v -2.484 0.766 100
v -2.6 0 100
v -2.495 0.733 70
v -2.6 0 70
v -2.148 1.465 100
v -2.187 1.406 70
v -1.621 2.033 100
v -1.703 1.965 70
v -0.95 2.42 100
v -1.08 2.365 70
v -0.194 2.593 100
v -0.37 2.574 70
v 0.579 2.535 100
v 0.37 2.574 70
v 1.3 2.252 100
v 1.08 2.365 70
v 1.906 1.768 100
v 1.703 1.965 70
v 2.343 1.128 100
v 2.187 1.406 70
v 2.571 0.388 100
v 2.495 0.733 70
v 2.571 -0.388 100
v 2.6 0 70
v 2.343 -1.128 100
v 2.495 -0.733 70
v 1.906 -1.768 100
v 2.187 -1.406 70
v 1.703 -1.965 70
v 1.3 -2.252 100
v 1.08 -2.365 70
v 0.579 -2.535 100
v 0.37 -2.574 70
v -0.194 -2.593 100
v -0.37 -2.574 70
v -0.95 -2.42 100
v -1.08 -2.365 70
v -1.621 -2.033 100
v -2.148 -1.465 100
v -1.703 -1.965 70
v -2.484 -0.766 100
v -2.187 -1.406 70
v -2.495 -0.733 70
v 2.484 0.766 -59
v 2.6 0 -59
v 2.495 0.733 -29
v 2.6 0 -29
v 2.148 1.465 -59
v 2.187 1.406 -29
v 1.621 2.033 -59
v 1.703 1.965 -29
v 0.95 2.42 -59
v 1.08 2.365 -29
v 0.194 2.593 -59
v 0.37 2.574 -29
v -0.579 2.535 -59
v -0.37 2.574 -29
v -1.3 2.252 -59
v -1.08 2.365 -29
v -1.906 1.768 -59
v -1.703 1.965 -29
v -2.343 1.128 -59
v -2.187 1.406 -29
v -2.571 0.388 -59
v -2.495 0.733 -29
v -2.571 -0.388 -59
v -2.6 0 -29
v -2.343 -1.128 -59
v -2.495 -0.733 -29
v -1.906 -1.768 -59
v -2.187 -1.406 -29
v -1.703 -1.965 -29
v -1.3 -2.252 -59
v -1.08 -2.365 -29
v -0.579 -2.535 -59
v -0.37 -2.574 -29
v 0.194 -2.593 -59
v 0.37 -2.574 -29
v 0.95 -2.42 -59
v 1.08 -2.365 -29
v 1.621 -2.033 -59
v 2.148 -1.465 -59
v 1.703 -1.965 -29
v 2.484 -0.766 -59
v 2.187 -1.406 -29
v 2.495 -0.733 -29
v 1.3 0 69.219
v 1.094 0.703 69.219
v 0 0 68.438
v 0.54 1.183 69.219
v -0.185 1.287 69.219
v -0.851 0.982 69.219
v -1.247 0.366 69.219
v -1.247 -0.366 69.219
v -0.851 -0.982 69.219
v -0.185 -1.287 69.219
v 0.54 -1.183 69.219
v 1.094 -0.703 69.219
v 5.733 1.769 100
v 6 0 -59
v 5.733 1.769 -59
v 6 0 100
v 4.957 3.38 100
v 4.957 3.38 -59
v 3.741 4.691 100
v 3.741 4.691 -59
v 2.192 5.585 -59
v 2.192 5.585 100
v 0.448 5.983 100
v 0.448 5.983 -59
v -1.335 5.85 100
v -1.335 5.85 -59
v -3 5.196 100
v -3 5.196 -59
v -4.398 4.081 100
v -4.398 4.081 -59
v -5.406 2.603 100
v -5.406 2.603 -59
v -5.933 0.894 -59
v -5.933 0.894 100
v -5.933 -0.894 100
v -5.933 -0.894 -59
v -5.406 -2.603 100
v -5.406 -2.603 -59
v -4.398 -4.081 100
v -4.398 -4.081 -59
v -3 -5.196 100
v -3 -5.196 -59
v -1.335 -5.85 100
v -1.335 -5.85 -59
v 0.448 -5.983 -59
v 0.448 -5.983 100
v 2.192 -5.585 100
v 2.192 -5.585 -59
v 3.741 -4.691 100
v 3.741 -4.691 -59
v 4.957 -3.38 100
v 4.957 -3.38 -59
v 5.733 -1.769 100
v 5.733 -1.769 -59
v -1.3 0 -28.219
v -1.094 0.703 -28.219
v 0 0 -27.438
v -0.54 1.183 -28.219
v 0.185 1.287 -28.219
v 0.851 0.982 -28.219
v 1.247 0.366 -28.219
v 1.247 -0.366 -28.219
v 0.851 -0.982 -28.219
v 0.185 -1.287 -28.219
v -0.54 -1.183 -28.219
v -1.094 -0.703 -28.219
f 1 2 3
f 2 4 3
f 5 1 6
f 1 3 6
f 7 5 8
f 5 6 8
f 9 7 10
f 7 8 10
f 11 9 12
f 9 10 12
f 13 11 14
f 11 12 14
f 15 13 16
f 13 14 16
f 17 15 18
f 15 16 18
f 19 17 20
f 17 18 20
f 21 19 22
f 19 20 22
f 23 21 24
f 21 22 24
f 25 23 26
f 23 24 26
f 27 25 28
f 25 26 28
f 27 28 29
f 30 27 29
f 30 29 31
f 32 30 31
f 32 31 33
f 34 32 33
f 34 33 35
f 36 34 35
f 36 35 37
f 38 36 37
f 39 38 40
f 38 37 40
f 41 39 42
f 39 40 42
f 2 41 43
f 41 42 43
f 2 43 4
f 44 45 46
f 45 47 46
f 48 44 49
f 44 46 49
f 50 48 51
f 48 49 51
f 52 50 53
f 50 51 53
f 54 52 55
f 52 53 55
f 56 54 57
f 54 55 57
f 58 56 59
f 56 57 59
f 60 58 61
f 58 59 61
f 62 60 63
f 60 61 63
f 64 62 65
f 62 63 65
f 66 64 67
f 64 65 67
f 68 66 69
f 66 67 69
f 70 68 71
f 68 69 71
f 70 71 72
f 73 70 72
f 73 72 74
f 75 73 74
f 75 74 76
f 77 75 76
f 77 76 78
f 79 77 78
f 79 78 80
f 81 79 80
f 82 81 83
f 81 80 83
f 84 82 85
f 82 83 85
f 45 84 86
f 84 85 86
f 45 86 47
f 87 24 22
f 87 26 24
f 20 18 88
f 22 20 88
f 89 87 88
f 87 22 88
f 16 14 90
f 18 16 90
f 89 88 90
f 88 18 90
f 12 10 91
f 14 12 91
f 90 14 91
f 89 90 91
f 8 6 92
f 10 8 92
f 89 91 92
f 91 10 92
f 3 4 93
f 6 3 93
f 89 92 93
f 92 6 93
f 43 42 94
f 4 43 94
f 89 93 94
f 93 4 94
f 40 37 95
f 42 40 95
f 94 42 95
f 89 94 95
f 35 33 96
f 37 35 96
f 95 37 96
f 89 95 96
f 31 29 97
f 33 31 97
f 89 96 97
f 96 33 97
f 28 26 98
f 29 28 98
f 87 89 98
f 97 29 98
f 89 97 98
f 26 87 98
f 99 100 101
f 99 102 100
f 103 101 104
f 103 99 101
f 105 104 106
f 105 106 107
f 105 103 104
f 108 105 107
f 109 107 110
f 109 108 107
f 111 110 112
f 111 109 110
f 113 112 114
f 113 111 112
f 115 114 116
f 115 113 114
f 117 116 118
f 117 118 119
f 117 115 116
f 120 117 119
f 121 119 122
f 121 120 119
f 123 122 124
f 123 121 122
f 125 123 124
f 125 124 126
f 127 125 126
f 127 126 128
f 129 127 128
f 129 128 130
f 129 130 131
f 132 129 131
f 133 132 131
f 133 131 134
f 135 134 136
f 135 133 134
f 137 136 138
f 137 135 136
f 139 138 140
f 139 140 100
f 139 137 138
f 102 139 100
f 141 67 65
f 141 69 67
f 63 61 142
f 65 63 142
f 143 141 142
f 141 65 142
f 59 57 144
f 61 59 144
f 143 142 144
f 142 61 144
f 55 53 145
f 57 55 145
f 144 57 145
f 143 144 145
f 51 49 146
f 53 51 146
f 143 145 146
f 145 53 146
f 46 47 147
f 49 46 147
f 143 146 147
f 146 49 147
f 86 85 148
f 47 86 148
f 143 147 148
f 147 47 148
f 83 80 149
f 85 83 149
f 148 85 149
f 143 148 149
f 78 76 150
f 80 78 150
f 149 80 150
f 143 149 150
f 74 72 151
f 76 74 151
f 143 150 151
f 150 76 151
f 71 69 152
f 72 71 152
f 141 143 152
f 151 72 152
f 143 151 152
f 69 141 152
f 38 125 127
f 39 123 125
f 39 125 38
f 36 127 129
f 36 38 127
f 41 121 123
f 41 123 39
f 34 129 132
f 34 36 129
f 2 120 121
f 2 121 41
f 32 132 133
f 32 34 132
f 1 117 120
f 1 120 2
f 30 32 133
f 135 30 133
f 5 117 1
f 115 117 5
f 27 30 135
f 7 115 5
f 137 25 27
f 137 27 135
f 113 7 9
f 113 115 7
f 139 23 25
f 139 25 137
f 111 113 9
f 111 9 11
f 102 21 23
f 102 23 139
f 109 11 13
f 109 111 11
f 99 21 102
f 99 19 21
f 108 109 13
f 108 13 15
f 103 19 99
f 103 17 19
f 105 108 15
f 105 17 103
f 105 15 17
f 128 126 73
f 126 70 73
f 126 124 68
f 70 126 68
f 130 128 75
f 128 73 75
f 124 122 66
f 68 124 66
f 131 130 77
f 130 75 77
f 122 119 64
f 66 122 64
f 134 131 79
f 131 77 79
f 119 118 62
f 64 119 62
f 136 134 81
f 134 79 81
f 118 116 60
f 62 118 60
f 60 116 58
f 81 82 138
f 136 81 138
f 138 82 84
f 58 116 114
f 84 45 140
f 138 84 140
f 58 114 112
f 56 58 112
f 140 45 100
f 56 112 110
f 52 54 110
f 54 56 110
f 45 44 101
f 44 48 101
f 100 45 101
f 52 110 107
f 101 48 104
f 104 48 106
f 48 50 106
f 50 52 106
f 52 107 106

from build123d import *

# Parameters (mm, degrees)
SKETCH1_R                        = 6
BOSS_EXTRUDE1_DEPTH              = 100
BOSS_EXTRUDE1_DEPTH_BACK         = 59
TAP_DRILL_FOR_M5_HELICOIL1_D     = 5.2
TAP_DRILL_FOR_M5_HELICOIL1_DEPTH = 30
TAP_DRILL_FOR_M5_HELICOIL1_TIP   = 1.562237609
TAP_DRILL_FOR_M5_HELICOIL2_D     = 5.2
TAP_DRILL_FOR_M5_HELICOIL2_DEPTH = 30
TAP_DRILL_FOR_M5_HELICOIL2_TIP   = 1.562237609


with BuildPart() as part:
    # Sketch1 → Boss-Extrude1 (new body, two sides)
    with BuildSketch(Plane.XY) as boss_extrude1_sk:
        Circle(SKETCH1_R)
    extrude(amount=BOSS_EXTRUDE1_DEPTH)
    extrude(boss_extrude1_sk.sketch, amount=-BOSS_EXTRUDE1_DEPTH_BACK)

    # Tap Drill for M5 Helicoil1
    with Locations(Plane.XY.offset(100)):
        with Locations((0, 0)):
            Hole(TAP_DRILL_FOR_M5_HELICOIL1_D / 2, depth=TAP_DRILL_FOR_M5_HELICOIL1_DEPTH)
            with Locations((0, 0, -(TAP_DRILL_FOR_M5_HELICOIL1_DEPTH + TAP_DRILL_FOR_M5_HELICOIL1_TIP / 2))):  # 118° drill point
                Cone(0, TAP_DRILL_FOR_M5_HELICOIL1_D / 2, TAP_DRILL_FOR_M5_HELICOIL1_TIP, mode=Mode.SUBTRACT)

    # Tap Drill for M5 Helicoil2
    with Locations(Plane(origin=(0, 0, -59), x_dir=(-1, 0, 0), z_dir=(0, 0, -1))):
        with Locations((0, 0)):
            Hole(TAP_DRILL_FOR_M5_HELICOIL2_D / 2, depth=TAP_DRILL_FOR_M5_HELICOIL2_DEPTH)
            with Locations((0, 0, -(TAP_DRILL_FOR_M5_HELICOIL2_DEPTH + TAP_DRILL_FOR_M5_HELICOIL2_TIP / 2))):  # 118° drill point
                Cone(0, TAP_DRILL_FOR_M5_HELICOIL2_D / 2, TAP_DRILL_FOR_M5_HELICOIL2_TIP, mode=Mode.SUBTRACT)


solid = part.part
